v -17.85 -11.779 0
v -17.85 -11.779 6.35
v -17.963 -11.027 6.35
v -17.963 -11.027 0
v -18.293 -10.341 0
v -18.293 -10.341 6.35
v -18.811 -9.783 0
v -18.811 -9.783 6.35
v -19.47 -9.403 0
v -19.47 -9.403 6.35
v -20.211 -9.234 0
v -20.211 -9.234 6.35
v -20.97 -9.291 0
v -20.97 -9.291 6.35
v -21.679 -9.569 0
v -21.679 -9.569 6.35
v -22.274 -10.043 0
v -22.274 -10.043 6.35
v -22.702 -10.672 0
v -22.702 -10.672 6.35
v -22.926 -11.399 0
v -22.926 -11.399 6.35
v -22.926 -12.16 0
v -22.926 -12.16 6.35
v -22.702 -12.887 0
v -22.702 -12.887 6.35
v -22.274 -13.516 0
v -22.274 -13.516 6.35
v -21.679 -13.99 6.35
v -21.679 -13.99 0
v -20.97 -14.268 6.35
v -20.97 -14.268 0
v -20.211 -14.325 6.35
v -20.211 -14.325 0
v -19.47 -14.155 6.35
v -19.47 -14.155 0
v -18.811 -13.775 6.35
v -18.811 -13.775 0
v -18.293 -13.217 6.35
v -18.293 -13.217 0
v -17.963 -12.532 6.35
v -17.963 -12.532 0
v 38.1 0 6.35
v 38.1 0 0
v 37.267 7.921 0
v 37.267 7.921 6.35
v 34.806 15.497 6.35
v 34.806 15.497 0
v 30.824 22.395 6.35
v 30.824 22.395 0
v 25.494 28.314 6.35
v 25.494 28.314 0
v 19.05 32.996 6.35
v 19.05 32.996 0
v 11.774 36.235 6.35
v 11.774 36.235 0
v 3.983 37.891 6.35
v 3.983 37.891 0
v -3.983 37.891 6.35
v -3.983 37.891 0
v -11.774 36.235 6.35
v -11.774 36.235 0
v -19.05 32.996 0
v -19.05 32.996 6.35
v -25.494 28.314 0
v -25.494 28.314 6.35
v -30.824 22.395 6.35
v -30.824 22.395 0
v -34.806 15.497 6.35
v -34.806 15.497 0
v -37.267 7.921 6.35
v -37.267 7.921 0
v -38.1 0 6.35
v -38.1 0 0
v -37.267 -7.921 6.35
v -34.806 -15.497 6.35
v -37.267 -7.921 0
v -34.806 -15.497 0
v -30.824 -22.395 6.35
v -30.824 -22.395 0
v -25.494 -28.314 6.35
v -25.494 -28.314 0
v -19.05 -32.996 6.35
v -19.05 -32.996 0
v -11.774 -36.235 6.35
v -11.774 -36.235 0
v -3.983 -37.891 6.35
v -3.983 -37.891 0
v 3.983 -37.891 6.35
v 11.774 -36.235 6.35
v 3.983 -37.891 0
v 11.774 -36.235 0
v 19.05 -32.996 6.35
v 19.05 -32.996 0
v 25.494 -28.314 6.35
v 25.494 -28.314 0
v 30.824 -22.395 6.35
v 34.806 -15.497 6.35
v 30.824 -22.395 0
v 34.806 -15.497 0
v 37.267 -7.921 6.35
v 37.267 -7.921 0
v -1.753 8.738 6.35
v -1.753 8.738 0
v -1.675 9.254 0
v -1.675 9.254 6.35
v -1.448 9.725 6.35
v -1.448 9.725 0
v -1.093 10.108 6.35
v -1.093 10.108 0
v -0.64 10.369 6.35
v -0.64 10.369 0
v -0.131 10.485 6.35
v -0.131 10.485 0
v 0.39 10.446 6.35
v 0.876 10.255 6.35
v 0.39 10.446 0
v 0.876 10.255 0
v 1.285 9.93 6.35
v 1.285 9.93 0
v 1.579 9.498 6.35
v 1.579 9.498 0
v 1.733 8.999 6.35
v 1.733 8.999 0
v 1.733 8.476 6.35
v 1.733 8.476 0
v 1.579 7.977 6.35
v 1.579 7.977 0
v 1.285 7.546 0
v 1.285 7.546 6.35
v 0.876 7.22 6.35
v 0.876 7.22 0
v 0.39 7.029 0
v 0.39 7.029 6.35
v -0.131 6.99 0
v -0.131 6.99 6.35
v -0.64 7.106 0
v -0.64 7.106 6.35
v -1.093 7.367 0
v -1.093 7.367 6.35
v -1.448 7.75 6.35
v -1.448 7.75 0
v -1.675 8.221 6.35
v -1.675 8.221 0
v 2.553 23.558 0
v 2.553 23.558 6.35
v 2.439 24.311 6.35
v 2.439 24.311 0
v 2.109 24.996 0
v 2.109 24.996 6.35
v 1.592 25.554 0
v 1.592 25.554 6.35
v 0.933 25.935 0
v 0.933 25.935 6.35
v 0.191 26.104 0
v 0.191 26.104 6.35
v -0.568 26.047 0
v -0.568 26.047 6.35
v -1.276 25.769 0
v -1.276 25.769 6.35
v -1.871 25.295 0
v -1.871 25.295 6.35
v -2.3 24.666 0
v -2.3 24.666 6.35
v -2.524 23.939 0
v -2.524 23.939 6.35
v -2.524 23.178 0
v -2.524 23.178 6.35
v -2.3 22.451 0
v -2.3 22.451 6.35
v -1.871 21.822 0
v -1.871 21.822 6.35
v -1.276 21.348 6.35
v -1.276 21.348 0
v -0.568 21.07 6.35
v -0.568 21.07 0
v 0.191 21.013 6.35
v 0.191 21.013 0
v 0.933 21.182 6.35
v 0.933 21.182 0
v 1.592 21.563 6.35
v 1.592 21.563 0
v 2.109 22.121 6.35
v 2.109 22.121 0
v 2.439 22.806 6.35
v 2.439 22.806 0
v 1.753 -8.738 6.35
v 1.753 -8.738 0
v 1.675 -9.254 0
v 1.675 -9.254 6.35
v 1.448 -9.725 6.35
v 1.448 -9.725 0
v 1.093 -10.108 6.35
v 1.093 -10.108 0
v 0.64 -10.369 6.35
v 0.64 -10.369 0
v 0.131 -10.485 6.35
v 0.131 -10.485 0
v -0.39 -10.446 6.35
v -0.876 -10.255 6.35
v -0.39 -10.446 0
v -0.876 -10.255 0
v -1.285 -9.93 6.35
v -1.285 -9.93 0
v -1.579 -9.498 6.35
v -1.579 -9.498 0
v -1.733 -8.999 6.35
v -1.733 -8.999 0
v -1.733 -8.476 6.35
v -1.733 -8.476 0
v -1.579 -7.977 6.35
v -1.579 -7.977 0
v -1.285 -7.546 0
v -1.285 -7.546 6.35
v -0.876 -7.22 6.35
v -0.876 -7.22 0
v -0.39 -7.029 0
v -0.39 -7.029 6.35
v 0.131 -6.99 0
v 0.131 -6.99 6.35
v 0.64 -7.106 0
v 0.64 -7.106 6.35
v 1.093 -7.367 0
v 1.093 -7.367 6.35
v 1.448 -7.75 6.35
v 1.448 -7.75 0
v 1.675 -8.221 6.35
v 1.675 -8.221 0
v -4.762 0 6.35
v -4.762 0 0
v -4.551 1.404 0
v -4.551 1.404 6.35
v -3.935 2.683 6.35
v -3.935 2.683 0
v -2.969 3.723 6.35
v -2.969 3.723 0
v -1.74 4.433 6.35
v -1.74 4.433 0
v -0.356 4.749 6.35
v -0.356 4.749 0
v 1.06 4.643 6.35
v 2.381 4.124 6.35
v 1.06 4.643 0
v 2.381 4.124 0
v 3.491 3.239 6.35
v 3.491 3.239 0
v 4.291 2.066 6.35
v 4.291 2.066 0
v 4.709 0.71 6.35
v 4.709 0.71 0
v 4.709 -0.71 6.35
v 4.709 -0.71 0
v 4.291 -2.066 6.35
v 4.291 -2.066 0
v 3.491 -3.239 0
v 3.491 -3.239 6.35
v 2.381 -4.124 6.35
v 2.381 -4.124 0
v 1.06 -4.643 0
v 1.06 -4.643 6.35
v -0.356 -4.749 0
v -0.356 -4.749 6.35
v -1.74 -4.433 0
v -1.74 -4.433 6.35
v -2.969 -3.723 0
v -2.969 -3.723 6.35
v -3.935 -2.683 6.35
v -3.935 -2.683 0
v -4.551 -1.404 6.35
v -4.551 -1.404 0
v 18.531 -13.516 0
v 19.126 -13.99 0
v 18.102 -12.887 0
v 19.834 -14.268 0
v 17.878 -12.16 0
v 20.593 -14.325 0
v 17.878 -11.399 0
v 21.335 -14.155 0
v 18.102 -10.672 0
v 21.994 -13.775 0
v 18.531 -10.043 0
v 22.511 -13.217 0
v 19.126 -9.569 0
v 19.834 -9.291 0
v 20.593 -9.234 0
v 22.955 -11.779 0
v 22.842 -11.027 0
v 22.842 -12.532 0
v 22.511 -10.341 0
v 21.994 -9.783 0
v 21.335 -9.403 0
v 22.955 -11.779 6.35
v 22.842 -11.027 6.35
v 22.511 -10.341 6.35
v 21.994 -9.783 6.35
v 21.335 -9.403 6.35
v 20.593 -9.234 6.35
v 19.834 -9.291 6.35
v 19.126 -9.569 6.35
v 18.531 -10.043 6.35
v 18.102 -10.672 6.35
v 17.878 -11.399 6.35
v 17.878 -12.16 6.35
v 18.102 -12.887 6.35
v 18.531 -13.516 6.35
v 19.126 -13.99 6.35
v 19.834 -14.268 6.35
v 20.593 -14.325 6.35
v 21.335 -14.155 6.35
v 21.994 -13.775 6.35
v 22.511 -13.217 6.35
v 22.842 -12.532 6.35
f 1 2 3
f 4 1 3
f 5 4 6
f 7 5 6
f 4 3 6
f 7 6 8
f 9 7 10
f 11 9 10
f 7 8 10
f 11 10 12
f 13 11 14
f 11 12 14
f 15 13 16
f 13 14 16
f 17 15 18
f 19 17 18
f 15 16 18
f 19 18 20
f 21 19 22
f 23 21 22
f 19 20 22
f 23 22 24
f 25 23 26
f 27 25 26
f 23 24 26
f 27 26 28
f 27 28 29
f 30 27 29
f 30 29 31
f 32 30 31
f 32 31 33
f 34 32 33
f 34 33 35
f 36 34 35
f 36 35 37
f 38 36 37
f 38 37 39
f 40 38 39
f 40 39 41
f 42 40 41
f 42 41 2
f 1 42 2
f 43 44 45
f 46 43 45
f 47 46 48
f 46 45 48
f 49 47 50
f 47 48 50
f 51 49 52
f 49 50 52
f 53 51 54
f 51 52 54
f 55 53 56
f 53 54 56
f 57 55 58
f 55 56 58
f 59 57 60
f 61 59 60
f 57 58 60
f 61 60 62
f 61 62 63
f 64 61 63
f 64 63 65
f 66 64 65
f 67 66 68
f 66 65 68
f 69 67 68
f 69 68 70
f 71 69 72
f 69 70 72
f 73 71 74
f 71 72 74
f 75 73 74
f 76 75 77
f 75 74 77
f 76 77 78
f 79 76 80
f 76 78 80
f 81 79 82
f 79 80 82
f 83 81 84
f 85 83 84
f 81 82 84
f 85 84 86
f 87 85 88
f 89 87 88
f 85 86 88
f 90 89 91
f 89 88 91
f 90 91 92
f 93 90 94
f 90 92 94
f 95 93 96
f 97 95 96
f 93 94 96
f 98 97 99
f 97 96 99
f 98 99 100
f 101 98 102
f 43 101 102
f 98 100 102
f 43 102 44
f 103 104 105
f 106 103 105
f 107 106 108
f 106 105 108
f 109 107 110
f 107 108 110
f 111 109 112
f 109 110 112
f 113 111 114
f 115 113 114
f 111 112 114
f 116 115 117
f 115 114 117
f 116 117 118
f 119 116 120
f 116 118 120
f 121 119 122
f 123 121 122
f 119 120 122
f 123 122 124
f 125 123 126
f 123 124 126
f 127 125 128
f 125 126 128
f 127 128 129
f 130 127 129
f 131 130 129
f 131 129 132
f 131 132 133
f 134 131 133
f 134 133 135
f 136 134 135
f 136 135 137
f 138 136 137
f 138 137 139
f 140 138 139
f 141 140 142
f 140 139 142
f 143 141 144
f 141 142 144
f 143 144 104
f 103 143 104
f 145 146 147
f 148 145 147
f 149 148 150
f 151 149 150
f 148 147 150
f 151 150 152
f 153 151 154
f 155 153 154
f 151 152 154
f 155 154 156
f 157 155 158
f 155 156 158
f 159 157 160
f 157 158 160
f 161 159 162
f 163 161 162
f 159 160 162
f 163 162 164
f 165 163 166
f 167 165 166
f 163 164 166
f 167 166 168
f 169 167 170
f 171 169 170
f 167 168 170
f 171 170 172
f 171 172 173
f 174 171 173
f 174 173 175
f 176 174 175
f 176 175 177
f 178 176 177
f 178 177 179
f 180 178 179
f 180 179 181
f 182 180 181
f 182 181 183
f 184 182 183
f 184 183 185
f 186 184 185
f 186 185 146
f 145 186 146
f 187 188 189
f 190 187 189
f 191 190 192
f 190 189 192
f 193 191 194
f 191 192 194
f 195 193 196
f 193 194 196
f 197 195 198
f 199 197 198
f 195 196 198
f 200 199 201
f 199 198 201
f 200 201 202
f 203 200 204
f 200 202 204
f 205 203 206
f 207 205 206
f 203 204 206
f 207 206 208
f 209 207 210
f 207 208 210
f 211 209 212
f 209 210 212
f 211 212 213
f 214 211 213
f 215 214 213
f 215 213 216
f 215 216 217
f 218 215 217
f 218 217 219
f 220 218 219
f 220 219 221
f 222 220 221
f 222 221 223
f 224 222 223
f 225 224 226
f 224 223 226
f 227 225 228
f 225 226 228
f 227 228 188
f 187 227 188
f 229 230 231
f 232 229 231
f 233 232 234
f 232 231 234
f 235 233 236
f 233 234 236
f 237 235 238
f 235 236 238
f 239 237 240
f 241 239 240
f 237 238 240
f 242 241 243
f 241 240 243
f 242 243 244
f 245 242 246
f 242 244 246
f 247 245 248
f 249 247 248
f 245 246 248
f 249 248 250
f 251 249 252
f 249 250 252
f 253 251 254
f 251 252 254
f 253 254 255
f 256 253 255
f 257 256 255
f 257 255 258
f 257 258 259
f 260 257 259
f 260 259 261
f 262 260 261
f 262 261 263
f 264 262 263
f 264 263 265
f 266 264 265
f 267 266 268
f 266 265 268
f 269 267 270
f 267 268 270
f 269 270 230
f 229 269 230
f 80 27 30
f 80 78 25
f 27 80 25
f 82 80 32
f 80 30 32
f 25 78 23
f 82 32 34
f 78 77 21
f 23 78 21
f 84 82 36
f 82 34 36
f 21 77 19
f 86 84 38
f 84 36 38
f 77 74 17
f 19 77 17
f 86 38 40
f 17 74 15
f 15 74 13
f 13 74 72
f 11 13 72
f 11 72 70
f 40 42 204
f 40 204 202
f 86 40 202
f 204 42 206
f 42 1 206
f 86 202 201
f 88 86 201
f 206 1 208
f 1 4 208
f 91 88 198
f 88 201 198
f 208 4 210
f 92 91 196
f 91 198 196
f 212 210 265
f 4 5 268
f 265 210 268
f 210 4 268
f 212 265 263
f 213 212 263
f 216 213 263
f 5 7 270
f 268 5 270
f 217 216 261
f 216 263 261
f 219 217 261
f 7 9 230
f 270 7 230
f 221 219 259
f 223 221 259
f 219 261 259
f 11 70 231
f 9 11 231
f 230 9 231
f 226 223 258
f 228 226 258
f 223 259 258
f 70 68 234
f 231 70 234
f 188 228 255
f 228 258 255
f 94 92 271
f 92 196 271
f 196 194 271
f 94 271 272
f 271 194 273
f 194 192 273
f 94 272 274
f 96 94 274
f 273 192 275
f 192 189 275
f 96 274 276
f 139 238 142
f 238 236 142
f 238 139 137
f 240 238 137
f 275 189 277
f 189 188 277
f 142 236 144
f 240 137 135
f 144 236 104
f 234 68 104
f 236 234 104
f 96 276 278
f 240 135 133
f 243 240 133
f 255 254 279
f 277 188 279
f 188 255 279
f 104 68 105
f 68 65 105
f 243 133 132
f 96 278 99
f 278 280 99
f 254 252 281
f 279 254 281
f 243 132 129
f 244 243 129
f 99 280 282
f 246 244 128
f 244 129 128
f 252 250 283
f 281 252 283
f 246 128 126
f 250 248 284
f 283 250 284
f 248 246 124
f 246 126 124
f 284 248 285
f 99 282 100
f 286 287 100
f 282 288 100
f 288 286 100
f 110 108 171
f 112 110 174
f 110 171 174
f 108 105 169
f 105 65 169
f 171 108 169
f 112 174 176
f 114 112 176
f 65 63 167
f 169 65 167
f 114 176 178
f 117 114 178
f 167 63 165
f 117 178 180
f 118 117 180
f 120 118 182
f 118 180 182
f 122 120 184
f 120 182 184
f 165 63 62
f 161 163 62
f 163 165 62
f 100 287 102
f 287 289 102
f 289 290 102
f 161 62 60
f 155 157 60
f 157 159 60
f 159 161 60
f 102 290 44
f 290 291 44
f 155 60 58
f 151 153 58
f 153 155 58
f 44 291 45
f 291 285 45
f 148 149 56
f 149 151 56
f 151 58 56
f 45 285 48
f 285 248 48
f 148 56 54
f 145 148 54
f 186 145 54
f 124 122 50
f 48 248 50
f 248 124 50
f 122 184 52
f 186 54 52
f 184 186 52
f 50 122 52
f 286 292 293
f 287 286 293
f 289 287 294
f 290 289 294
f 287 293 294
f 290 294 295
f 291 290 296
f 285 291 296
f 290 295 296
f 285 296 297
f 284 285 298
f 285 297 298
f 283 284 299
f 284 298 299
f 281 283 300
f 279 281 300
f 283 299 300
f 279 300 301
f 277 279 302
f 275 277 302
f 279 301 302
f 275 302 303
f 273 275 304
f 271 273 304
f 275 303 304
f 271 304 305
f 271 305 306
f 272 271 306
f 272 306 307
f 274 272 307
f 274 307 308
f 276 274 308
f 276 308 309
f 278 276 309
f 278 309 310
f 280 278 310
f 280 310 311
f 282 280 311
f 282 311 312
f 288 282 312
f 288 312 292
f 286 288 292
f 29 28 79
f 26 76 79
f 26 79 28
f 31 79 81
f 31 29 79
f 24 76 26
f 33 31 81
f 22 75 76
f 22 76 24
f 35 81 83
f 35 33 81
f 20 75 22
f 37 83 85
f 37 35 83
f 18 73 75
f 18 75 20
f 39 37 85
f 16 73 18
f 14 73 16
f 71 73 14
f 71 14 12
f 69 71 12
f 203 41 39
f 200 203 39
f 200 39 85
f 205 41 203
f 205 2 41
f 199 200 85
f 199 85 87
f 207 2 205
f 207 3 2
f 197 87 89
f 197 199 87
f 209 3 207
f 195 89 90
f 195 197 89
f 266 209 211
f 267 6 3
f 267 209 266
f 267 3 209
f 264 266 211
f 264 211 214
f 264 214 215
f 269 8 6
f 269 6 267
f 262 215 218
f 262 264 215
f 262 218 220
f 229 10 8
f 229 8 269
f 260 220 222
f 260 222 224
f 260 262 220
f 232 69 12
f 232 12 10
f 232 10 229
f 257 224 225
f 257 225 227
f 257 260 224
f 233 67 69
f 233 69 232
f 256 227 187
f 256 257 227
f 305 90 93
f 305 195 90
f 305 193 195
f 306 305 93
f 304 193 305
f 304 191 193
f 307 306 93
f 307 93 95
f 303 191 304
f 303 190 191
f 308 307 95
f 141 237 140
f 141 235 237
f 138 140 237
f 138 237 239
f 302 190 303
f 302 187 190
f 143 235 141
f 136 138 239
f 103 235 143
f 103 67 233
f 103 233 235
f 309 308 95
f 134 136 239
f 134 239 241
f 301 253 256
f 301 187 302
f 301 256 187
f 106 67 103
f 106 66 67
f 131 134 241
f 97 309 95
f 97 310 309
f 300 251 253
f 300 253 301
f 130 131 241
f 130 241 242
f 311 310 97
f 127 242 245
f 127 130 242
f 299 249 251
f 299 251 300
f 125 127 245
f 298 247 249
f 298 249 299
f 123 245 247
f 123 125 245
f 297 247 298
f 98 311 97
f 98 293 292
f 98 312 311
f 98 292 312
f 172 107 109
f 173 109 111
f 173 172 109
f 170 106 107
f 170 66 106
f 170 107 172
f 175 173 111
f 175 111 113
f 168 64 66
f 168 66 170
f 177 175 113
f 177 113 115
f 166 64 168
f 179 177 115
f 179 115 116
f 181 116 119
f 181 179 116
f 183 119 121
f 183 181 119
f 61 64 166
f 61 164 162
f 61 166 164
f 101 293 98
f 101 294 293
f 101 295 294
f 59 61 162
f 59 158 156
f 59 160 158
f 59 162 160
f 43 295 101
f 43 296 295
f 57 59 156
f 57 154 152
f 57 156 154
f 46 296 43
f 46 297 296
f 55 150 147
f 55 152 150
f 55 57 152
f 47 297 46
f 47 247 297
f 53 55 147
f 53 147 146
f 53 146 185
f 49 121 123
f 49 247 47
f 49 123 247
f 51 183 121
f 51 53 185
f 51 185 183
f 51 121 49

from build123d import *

# Parameters (mm, degrees)
SKETCH1_R                  = 38.1
BOSS_EXTRUDE1_DEPTH        = 6.35
SKETCH2_R                  = 1.35255
CUT_EXTRUDE1_DEPTH         = 55.254423783
SKETCH3_R                  = 4.7625
CUT_EXTRUDE2_DEPTH         = 6.35
CIRPATTERN2_COUNT          = 3
SKETCH5_R                  = 1.7526
CUT_EXTRUDE4_DEPTH         = 6.35
CIRPATTERN3_COUNT          = 2
F_10_CLEARANCE_HOLE1_D     = 5.1054
F_10_CLEARANCE_HOLE1_DEPTH = 11.43
F_10_CLEARANCE_HOLE1_TIP   = 1.533816902


with BuildPart() as part:
    # Sketch1 → Boss-Extrude1 (new body)
    with BuildSketch(Plane.XY):
        Circle(SKETCH1_R)
    extrude(amount=BOSS_EXTRUDE1_DEPTH)

    # Sketch2 → Cut-Extrude1 (cut, through all)
    with BuildSketch(Plane.XY.offset(6.35)):
        with Locations((0, 23.5585)):
            Circle(SKETCH2_R)
    cut_extrude1 = extrude(amount=-CUT_EXTRUDE1_DEPTH, mode=Mode.SUBTRACT)

    # Sketch3 → Cut-Extrude2 (cut)
    with BuildSketch(Plane(origin=(0, 0, 0), x_dir=(-1, 0, 0), z_dir=(0, 0, -1))):
        Circle(SKETCH3_R)
    extrude(amount=-CUT_EXTRUDE2_DEPTH, mode=Mode.SUBTRACT)

    # CirPattern2: Cut-Extrude1 ×3 about axis
    cirpattern2_axis = Axis((0, 0, -0.3175), (0, 0, 1))
    for i in range(1, CIRPATTERN2_COUNT):
        add(cut_extrude1.rotate(cirpattern2_axis, i * 360 / CIRPATTERN2_COUNT), mode=Mode.SUBTRACT)

    # Sketch5 → Cut-Extrude4 (cut)
    with BuildSketch(Plane(origin=(0, 0, 0), x_dir=(-1, 0, 0), z_dir=(0, 0, -1))):
        with Locations((0, 8.7376)):
            Circle(SKETCH5_R)
    cut_extrude4 = extrude(amount=-CUT_EXTRUDE4_DEPTH, mode=Mode.SUBTRACT)

    # CirPattern3: Cut-Extrude4 ×2 about axis
    cirpattern3_axis = Axis((0, 0, -0.3175), (0, 0, 1))
    for i in range(1, CIRPATTERN3_COUNT):
        add(cut_extrude4.rotate(cirpattern3_axis, i * 360 / CIRPATTERN3_COUNT), mode=Mode.SUBTRACT)

    # #10 Clearance Hole1
    with Locations(Plane(origin=(0, 0, 0), x_dir=(-1, 0, 0), z_dir=(0, 0, -1))):
        with Locations((0, 23.5585), (-20.402259475, -11.77925), (20.402259475, -11.77925)):
            Hole(F_10_CLEARANCE_HOLE1_D / 2, depth=F_10_CLEARANCE_HOLE1_DEPTH)
            with Locations((0, 0, -(F_10_CLEARANCE_HOLE1_DEPTH + F_10_CLEARANCE_HOLE1_TIP / 2))):  # 118° drill point
                Cone(0, F_10_CLEARANCE_HOLE1_D / 2, F_10_CLEARANCE_HOLE1_TIP, mode=Mode.SUBTRACT)


solid = part.part
